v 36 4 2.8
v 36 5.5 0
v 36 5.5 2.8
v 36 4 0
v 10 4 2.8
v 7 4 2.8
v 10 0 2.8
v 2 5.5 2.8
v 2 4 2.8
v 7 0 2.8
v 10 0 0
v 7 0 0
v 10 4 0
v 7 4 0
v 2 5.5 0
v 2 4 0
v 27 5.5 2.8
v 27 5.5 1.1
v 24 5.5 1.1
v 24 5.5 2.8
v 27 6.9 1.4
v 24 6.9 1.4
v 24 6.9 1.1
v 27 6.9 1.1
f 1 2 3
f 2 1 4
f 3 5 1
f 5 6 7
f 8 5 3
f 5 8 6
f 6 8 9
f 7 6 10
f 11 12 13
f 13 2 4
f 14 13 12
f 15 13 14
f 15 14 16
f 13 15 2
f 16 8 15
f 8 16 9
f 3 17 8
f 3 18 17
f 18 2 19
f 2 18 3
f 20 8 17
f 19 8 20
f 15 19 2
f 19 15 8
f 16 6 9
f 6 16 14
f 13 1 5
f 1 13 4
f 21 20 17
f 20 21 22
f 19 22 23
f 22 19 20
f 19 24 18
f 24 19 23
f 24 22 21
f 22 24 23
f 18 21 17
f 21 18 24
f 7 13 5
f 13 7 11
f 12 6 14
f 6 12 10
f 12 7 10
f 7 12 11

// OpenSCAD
module latch() {
    translate([-6, 1, 0])
    cube([34, 1.5, 2.8]);
    
    
    translate([19, 2.5, 1.1])
    rotate([0, -90, 0])
    linear_extrude(3)
    polygon([[0, 0], [1.7, 0], [0.3, 1.4], [0, 1.4]]);
    
    translate([-1, -3, 0])
    cube([3, 4, 2.8]);
}

module cup() {
    latch();
}

module base() {
    cube([5, 7, 2.8]);
}

module preview() {
    latch();
}



%
base();

translate([8, 3, 0])
preview();
